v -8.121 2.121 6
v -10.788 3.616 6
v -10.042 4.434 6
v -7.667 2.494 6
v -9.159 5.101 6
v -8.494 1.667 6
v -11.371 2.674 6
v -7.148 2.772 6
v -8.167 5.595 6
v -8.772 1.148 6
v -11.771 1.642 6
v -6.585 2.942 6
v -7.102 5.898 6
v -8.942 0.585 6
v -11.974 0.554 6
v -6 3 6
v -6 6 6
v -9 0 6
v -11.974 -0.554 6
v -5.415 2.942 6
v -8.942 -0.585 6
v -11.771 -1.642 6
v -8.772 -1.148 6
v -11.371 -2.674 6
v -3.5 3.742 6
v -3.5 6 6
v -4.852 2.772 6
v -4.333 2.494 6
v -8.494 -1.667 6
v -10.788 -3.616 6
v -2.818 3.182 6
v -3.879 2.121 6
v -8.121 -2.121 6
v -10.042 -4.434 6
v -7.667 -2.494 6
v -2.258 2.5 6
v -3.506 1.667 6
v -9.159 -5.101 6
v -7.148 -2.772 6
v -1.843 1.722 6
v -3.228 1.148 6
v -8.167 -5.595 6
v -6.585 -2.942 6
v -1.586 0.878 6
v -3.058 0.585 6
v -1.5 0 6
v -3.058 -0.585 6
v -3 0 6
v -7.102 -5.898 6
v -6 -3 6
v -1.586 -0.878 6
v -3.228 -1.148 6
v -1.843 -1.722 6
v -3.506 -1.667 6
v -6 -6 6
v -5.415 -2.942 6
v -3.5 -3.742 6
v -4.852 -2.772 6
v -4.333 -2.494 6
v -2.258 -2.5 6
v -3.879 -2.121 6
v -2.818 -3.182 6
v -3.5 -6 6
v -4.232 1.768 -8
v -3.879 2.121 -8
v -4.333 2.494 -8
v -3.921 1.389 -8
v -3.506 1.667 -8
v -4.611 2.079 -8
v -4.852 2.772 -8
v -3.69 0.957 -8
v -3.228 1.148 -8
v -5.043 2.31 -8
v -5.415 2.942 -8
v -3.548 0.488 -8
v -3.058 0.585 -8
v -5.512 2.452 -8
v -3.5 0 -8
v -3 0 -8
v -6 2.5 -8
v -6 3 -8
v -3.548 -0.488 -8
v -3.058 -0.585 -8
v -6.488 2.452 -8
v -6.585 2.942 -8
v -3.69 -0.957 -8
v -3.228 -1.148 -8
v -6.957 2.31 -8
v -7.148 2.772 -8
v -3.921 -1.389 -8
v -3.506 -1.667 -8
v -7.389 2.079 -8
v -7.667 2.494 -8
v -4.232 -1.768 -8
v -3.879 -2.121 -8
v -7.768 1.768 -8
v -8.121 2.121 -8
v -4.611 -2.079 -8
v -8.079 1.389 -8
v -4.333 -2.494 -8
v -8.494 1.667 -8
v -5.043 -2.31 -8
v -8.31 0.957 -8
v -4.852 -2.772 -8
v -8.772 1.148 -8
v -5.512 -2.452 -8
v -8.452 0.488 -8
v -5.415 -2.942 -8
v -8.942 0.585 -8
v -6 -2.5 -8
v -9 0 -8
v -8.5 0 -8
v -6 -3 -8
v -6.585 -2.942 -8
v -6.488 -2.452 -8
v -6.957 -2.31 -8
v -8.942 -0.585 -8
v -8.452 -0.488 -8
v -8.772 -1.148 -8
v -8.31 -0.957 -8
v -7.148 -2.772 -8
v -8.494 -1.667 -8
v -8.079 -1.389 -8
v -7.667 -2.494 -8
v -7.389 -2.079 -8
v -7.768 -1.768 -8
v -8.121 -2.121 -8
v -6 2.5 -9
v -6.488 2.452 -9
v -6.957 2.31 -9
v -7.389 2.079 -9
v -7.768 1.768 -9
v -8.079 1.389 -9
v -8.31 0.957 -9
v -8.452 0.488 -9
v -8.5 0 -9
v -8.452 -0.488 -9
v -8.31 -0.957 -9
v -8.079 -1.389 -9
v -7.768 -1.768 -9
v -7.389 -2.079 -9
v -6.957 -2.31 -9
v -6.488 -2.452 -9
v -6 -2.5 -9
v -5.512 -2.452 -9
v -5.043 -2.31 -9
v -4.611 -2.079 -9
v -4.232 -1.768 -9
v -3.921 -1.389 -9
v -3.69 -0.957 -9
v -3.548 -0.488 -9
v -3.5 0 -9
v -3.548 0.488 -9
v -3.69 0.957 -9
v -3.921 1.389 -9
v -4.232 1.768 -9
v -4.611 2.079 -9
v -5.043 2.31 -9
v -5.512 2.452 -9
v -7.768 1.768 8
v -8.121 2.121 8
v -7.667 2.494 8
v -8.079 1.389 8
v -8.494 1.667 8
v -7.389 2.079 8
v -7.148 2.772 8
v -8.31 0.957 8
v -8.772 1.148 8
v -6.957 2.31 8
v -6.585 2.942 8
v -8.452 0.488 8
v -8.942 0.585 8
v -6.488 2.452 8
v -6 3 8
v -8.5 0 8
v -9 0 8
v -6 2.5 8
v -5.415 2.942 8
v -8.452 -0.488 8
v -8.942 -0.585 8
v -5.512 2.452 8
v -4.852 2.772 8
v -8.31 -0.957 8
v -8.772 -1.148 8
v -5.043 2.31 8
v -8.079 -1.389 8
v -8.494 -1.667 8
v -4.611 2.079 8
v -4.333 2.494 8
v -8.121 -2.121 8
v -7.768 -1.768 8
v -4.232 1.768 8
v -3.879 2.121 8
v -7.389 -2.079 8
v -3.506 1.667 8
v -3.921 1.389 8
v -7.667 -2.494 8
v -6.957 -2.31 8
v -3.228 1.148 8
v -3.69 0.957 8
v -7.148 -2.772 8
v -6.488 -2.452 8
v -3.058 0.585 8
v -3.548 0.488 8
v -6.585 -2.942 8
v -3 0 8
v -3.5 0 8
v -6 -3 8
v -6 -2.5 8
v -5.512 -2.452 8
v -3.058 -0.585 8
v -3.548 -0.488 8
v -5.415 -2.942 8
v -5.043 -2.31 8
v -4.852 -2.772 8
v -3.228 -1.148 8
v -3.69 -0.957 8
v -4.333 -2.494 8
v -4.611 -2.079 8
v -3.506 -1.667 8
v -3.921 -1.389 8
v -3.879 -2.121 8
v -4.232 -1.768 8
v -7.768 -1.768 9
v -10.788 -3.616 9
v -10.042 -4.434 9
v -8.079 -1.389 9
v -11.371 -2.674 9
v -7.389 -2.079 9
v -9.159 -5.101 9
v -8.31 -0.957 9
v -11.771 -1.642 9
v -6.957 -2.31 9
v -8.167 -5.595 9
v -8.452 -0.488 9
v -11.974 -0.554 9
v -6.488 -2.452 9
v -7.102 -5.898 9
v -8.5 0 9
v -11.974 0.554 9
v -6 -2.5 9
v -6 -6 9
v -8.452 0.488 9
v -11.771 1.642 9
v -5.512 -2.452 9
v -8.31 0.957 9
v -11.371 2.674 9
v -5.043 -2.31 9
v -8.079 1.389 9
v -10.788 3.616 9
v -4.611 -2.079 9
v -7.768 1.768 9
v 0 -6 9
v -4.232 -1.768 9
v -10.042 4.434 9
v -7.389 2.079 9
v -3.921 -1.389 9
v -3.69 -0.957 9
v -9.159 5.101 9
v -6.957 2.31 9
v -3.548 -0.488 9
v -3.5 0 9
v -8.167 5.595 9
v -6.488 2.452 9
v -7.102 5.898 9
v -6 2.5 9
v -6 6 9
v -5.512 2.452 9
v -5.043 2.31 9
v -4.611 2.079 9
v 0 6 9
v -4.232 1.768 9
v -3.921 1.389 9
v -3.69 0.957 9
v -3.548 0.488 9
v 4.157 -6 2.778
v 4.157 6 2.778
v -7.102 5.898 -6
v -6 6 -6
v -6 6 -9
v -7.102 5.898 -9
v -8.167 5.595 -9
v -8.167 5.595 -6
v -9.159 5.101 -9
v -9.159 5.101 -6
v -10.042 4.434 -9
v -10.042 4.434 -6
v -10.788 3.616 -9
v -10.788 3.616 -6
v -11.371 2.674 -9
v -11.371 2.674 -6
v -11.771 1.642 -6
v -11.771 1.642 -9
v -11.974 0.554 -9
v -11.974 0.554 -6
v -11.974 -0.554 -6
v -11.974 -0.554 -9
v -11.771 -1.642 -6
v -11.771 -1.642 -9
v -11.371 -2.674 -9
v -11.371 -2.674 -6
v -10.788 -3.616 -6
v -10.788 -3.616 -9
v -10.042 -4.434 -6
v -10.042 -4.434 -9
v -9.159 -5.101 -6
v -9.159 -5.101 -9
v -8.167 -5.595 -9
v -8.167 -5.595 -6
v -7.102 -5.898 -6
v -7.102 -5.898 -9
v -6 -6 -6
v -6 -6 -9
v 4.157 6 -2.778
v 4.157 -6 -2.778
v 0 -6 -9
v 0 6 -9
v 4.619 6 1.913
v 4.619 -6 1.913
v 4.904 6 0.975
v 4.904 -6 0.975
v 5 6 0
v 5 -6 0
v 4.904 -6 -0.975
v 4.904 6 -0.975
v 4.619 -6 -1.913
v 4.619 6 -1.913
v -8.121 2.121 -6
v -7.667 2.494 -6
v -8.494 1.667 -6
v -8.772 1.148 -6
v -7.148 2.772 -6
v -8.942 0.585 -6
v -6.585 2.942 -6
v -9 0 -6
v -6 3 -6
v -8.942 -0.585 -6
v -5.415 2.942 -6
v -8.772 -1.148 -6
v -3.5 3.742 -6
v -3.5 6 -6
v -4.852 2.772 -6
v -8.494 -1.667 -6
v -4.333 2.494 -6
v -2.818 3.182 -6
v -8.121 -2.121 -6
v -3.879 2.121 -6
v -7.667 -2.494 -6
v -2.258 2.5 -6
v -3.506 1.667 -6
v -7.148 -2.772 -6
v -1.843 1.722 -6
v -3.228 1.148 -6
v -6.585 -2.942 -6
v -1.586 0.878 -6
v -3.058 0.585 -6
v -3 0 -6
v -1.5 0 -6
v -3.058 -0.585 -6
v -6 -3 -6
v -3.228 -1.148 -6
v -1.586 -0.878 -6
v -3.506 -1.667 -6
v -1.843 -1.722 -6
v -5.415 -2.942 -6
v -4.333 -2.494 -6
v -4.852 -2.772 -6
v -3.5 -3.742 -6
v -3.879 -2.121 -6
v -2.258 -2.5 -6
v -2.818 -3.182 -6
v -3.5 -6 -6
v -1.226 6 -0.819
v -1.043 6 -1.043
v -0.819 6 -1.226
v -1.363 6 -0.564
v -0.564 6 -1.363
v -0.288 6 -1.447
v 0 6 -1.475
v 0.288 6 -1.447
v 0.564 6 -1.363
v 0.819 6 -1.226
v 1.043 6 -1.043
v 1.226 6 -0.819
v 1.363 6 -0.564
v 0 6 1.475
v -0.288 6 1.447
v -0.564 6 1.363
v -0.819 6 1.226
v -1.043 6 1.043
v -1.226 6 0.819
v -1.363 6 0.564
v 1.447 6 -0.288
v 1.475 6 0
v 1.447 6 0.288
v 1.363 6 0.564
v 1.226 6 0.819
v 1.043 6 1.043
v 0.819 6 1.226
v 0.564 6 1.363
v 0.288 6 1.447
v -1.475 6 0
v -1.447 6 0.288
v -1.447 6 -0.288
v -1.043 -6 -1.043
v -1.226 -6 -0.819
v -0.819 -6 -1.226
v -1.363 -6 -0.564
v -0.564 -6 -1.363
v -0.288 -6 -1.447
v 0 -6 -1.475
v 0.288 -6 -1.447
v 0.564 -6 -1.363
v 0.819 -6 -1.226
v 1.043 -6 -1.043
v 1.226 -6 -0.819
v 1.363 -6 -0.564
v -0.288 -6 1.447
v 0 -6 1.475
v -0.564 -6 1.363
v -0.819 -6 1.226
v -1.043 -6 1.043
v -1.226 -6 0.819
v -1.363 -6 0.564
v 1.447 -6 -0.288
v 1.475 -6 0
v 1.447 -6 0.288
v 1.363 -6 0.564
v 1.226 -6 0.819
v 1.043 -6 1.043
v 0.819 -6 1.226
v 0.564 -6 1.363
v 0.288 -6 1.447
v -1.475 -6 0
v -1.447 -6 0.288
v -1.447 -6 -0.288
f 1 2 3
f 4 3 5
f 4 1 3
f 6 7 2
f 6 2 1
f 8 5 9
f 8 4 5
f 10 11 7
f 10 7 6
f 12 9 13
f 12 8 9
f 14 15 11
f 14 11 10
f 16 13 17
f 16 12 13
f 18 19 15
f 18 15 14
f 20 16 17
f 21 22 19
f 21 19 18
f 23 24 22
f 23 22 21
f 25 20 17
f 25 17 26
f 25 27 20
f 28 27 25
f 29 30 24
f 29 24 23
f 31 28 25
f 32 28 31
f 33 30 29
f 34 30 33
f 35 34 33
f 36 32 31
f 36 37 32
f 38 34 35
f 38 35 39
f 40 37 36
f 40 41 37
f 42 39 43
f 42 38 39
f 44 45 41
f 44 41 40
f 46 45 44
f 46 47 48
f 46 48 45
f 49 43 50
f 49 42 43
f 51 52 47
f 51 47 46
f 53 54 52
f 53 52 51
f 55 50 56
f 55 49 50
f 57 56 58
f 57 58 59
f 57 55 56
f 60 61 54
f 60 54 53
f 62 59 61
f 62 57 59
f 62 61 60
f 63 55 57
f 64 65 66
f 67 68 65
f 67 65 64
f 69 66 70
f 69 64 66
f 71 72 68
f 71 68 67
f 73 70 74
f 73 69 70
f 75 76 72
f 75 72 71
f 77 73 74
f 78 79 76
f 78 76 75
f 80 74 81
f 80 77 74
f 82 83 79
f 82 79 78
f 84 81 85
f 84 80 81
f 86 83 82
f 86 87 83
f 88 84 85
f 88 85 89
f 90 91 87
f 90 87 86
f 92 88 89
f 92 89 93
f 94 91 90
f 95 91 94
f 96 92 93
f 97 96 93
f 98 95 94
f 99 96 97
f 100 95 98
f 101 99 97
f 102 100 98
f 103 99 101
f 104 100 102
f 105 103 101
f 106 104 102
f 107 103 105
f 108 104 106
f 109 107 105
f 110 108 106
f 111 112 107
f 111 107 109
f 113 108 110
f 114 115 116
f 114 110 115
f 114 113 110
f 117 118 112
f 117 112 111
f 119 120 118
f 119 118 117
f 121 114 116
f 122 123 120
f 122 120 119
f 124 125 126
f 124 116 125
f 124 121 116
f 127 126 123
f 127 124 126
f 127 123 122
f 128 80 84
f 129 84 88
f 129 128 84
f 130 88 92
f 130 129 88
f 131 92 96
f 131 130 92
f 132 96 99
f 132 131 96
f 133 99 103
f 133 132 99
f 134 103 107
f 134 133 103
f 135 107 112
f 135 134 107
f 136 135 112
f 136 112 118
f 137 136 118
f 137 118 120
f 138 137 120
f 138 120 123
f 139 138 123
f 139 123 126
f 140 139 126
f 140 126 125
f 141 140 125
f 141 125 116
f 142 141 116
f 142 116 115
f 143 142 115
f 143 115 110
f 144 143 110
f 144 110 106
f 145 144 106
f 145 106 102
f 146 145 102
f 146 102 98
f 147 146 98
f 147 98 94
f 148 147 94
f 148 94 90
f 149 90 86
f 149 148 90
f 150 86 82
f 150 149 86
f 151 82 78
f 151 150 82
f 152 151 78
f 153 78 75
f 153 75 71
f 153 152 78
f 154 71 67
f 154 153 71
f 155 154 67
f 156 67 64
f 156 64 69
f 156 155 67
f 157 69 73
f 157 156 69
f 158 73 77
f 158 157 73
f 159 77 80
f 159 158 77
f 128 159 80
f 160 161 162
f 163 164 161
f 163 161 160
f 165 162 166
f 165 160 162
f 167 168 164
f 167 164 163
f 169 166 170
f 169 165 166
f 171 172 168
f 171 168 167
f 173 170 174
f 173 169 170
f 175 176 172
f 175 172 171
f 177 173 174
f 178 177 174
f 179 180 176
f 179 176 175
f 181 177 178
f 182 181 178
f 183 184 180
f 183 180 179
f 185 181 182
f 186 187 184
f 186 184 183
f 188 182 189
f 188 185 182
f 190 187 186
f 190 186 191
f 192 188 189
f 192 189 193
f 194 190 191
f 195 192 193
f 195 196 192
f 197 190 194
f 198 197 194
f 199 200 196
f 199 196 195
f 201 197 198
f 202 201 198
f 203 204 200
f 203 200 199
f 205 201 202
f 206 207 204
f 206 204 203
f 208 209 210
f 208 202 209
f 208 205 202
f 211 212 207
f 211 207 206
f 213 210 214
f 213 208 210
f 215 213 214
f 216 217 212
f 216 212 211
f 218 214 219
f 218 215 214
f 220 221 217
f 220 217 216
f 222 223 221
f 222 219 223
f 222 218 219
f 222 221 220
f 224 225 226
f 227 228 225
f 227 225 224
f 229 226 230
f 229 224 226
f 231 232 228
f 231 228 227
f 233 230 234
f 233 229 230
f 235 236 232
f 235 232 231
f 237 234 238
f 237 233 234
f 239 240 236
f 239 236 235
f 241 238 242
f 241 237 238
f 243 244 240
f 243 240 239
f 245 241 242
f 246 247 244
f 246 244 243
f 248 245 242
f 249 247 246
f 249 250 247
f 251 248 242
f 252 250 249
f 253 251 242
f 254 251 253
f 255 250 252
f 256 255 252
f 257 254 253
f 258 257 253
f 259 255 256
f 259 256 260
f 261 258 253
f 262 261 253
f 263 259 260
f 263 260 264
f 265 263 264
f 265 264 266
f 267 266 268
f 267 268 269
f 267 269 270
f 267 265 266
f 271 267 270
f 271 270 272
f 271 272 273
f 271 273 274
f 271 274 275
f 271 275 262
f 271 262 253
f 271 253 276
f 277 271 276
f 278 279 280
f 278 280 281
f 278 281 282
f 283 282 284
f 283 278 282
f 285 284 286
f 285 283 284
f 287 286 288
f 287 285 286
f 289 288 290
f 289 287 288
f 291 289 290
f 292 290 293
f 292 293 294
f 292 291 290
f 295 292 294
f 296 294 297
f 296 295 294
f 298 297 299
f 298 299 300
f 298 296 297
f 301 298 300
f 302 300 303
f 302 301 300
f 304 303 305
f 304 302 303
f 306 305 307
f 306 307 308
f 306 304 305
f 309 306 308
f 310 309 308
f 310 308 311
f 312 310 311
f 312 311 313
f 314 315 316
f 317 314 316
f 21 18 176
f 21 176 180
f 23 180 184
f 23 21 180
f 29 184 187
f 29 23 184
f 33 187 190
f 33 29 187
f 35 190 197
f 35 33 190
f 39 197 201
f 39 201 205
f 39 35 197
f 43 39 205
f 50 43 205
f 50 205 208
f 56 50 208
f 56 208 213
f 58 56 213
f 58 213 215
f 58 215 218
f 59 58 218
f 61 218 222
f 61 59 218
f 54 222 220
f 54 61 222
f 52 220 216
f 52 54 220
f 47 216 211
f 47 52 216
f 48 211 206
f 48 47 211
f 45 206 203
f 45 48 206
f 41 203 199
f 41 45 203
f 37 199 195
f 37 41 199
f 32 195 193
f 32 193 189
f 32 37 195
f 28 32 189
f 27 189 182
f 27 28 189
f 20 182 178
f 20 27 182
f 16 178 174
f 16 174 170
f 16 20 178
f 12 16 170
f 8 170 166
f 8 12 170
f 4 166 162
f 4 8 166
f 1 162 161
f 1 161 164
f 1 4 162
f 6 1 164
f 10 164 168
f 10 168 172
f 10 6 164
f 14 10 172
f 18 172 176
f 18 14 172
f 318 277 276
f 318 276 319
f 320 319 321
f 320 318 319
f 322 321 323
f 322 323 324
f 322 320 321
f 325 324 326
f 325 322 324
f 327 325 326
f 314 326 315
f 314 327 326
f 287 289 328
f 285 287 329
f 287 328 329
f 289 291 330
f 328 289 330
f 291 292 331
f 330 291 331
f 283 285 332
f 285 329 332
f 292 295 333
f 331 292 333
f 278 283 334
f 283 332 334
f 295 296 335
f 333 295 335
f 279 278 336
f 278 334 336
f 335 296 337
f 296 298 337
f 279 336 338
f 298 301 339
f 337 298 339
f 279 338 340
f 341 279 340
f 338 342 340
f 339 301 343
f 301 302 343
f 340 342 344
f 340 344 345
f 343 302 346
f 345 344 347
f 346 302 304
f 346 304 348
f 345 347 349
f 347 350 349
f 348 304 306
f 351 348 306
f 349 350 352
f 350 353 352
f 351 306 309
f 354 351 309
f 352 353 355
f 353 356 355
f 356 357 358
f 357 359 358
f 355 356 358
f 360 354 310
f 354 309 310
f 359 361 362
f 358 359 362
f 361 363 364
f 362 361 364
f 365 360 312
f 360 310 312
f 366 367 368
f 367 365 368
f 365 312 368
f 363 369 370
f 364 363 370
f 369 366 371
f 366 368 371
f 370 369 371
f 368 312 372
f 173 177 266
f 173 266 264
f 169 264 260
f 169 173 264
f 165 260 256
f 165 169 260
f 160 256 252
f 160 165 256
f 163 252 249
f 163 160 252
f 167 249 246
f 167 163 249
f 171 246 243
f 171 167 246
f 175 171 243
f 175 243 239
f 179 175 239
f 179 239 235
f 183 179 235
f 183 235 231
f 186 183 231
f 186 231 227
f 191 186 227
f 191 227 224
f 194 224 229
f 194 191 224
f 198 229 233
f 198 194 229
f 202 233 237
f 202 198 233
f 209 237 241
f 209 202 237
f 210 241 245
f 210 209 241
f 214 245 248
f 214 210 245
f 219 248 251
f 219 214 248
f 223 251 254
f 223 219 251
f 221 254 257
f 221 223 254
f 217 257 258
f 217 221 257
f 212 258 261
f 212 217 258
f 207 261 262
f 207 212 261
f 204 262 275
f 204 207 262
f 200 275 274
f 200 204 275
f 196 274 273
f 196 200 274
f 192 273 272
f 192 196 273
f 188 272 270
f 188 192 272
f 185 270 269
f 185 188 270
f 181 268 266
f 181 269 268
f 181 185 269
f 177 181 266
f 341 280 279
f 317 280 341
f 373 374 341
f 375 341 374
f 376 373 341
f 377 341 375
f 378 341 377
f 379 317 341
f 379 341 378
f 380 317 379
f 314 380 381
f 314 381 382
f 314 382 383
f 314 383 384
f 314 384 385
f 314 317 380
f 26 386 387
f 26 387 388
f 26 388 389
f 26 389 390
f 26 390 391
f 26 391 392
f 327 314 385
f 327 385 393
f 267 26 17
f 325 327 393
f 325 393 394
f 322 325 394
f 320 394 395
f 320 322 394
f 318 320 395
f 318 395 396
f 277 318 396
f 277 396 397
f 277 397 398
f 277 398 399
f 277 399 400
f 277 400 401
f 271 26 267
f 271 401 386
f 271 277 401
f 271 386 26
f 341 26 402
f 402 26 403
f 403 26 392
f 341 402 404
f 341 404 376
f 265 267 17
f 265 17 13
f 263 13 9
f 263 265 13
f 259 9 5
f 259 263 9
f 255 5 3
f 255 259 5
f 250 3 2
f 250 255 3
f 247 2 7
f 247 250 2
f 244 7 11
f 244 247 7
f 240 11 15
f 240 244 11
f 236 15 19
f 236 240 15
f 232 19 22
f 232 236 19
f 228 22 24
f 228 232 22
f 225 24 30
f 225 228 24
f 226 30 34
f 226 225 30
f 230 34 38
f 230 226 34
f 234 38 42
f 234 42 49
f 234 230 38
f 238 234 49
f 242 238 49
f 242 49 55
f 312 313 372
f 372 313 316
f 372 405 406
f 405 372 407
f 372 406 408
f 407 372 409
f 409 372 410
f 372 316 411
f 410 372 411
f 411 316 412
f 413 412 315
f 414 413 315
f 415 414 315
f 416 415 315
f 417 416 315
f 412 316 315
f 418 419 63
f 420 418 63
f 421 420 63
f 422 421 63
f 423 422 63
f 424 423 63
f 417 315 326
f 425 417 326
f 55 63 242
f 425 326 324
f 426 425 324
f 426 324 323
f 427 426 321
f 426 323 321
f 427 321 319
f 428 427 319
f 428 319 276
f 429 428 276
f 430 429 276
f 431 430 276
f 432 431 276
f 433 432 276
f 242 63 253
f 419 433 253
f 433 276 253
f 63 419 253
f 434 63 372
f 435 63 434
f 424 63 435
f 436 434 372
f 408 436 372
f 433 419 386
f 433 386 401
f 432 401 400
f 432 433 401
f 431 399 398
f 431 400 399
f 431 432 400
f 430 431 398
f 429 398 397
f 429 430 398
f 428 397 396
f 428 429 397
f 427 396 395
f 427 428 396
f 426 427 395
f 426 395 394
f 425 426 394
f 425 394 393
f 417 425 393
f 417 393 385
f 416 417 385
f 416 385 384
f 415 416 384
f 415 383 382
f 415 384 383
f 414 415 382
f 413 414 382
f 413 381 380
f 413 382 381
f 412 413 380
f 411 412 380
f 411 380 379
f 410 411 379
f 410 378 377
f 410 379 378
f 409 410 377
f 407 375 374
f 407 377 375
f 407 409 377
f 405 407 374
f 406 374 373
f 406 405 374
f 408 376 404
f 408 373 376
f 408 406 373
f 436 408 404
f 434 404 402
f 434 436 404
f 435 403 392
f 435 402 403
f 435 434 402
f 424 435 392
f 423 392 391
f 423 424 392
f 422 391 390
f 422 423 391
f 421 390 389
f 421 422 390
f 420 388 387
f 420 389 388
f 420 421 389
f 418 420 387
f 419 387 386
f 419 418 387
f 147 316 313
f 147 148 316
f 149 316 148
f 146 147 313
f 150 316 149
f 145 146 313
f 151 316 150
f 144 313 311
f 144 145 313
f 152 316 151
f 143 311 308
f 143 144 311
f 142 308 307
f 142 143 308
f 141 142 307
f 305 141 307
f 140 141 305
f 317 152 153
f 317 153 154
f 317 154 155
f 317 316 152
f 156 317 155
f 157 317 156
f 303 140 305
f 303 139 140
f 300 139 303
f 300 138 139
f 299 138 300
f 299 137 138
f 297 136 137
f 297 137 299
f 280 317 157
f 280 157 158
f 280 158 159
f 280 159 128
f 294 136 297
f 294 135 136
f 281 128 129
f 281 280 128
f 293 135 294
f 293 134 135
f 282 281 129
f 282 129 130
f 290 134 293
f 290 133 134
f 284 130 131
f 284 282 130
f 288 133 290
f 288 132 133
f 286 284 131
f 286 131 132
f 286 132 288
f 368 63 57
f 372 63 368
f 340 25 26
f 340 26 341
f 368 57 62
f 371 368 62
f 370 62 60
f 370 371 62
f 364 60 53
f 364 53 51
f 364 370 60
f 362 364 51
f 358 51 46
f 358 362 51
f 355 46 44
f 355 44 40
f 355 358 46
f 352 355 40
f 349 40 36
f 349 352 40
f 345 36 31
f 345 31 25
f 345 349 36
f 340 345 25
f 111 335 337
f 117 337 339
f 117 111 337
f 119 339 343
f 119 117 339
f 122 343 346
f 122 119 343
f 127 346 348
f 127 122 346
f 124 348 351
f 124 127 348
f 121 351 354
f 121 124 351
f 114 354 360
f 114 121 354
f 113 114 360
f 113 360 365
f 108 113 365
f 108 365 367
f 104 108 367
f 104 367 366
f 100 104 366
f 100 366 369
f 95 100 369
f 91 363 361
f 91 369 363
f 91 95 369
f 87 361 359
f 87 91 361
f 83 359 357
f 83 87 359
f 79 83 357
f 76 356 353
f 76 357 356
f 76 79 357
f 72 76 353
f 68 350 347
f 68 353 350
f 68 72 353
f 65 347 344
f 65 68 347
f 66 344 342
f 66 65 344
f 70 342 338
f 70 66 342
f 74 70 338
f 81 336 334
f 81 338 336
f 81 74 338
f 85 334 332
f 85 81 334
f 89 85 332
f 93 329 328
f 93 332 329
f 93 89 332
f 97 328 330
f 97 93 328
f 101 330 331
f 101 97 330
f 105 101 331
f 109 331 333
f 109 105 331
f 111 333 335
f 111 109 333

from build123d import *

# Parameters (mm, degrees)
SKETCH1_R               = 6
SKETCH1_R_2             = 2.5
BOSS_EXTRUDE1_DEPTH     = 9
SKETCH2_R               = 5
SKETCH2_R_2             = 1.475
BOSS_EXTRUDE2_DEPTH     = 6
BOSS_EXTRUDE3_DEPTH     = 6
CUT_EXTRUDE2_DEPTH      = 17.155494421
CUT_EXTRUDE2_DEPTH_BACK = 17.155494421
SKETCH5_R               = 1.475
SKETCH5_W               = 8.5
SKETCH5_H               = 12


with BuildPart() as part:
    # Sketch1 → Boss-Extrude1 (new, symmetric)
    with BuildSketch(Plane.XY):
        with Locations((-6, 0)):
            Circle(SKETCH1_R)
        with Locations((-6, 0)):
            Circle(SKETCH1_R_2, mode=Mode.SUBTRACT)
    extrude(amount=BOSS_EXTRUDE1_DEPTH, both=True)

    # Sketch2 → Boss-Extrude2 (add, symmetric)
    with BuildSketch(Plane(origin=(0, 0, 0), x_dir=(1, 0, 0), z_dir=(0, 1, 0))):
        Circle(SKETCH2_R)
        Circle(SKETCH2_R_2, mode=Mode.SUBTRACT)
    extrude(amount=BOSS_EXTRUDE2_DEPTH, both=True)

    # Sketch4 → Boss-Extrude3 (add, symmetric)
    with BuildSketch(Plane(origin=(0, 0, 0), x_dir=(1, 0, 0), z_dir=(0, 1, 0))):
        with BuildLine():
            Line((-6, 9), (-6, -9))
            Line((-6, -9), (0, -9))
            Line((0, -9), (4.157397096, -2.777777778))
            ThreePointArc((4.157397096, -2.777777778), (5, 0), (4.157397096, 2.777777778))
            Line((4.157397096, 2.777777778), (0, 9))
            Line((0, 9), (-6, 9))
        make_face()
    extrude(amount=BOSS_EXTRUDE3_DEPTH, both=True)

    # Sketch3 → Cut-Revolve1 (revolve, cut)
    with BuildSketch(Plane(origin=(0, 0, 0), x_dir=(1, 0, 0), z_dir=(0, 1, 0))):
        Polygon((-3.5, 8), (-3.5, 9), (-6, 9), (-6, -9), (-3.5, -9), (-3.5, -8), (-3, -8), (-3, -6), (-1.5, -6), (-1.5, 6), (-3, 6), (-3, 8), align=None)
    revolve(axis=Axis((-6, 0, -12.234149704), (0, 0, 1)), mode=Mode.SUBTRACT)

    # Sketch5 → Cut-Extrude2 (cut, two sides: drawn at the far end of the back side and taken through both)
    with BuildSketch(Plane(origin=(0, 0, 0), x_dir=(1, 0, 0), z_dir=(0, 1, 0)).offset(-CUT_EXTRUDE2_DEPTH_BACK)):
        Circle(SKETCH5_R)
        with Locations((-7.75, 0)):
            Rectangle(SKETCH5_W, SKETCH5_H)
    extrude(amount=CUT_EXTRUDE2_DEPTH + CUT_EXTRUDE2_DEPTH_BACK, mode=Mode.SUBTRACT)


solid = part.part
